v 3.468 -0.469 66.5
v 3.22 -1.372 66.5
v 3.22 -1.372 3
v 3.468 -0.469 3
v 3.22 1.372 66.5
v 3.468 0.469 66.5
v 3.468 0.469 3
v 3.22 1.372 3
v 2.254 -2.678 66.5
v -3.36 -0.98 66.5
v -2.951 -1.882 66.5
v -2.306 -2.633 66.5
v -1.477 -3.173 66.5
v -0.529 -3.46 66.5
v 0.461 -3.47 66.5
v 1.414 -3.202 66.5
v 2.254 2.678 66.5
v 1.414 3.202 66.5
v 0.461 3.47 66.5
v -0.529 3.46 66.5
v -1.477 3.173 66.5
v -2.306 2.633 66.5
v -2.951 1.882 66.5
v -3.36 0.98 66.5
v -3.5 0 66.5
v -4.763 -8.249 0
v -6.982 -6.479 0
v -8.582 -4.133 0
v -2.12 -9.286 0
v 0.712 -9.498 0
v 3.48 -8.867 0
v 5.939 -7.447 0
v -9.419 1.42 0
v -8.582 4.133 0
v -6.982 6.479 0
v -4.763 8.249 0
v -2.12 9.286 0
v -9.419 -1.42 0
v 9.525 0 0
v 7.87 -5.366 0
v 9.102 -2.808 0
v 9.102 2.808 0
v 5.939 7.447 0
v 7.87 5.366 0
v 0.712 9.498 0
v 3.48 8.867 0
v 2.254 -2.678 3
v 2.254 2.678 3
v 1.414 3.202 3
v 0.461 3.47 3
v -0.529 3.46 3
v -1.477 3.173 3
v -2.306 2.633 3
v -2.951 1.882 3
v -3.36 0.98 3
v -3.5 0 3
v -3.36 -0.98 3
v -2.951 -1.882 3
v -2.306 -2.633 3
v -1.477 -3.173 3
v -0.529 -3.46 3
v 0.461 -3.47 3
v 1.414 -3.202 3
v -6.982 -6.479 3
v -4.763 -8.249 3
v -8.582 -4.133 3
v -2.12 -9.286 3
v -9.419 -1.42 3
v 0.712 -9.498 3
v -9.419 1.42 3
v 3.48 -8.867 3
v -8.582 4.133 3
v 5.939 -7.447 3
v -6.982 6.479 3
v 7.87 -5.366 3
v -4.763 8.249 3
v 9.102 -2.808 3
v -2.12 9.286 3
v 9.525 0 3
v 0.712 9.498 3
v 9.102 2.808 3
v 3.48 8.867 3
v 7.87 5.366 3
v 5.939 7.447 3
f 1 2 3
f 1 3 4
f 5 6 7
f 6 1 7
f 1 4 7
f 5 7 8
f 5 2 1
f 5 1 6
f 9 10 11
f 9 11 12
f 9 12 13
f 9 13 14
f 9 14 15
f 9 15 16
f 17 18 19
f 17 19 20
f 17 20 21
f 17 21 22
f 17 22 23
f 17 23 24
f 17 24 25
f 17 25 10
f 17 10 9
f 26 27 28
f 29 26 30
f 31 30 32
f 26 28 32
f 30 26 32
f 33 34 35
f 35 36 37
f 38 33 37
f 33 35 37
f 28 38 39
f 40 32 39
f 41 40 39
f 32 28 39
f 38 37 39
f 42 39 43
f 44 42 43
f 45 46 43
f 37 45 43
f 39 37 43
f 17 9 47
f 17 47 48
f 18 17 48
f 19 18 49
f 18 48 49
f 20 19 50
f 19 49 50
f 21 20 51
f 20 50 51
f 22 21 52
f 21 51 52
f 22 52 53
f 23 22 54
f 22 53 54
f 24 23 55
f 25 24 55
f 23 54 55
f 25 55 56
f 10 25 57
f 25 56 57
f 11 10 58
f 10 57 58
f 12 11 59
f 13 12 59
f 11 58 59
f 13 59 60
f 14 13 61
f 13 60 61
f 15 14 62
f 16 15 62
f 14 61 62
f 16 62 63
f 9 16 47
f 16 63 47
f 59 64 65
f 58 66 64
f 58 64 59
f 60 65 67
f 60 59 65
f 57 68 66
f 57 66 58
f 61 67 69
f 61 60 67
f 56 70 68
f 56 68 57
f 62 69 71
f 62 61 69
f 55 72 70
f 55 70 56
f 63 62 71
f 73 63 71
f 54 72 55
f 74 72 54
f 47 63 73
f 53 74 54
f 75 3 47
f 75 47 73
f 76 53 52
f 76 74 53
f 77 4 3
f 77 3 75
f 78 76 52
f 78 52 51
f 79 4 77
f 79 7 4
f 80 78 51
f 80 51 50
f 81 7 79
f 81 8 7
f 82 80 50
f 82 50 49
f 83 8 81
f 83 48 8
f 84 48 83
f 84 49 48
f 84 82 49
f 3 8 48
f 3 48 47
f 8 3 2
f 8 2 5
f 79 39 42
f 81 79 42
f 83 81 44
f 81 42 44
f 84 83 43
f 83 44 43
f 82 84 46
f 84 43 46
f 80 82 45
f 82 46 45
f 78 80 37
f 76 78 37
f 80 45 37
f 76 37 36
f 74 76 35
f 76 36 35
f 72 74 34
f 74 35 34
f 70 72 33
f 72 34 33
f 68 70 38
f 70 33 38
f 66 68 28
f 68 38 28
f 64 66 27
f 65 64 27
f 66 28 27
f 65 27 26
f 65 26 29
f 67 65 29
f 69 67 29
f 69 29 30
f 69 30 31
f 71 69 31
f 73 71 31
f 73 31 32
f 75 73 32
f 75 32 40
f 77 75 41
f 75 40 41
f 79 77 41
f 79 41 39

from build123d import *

# Parameters (mm, degrees)
F0_R     = 9.525
F1_DEPTH = 3
F2_R     = 3.5
F3_DEPTH = 63.5
F4_W     = 0.965913
F4_H     = 11.590985
F5_DEPTH = 63.5


with BuildPart() as f1:
    # F0 (on Top) → F1 (new body)
    with BuildSketch(Plane.XY):
        Circle(F0_R)
    extrude(amount=F1_DEPTH)

    # F2 (on face) → F3 (join)
    with BuildSketch(Plane.XY.offset(3)):
        Circle(F2_R)
    extrude(amount=F3_DEPTH)

    # F4 (on face) → F5 (cut)
    with BuildSketch(Plane.XY.offset(66.5)):
        with Locations((2.736762, -0.194345)):
            Rectangle(F4_W, F4_H)
    extrude(amount=-F5_DEPTH, mode=Mode.SUBTRACT)


solid = f1.part
